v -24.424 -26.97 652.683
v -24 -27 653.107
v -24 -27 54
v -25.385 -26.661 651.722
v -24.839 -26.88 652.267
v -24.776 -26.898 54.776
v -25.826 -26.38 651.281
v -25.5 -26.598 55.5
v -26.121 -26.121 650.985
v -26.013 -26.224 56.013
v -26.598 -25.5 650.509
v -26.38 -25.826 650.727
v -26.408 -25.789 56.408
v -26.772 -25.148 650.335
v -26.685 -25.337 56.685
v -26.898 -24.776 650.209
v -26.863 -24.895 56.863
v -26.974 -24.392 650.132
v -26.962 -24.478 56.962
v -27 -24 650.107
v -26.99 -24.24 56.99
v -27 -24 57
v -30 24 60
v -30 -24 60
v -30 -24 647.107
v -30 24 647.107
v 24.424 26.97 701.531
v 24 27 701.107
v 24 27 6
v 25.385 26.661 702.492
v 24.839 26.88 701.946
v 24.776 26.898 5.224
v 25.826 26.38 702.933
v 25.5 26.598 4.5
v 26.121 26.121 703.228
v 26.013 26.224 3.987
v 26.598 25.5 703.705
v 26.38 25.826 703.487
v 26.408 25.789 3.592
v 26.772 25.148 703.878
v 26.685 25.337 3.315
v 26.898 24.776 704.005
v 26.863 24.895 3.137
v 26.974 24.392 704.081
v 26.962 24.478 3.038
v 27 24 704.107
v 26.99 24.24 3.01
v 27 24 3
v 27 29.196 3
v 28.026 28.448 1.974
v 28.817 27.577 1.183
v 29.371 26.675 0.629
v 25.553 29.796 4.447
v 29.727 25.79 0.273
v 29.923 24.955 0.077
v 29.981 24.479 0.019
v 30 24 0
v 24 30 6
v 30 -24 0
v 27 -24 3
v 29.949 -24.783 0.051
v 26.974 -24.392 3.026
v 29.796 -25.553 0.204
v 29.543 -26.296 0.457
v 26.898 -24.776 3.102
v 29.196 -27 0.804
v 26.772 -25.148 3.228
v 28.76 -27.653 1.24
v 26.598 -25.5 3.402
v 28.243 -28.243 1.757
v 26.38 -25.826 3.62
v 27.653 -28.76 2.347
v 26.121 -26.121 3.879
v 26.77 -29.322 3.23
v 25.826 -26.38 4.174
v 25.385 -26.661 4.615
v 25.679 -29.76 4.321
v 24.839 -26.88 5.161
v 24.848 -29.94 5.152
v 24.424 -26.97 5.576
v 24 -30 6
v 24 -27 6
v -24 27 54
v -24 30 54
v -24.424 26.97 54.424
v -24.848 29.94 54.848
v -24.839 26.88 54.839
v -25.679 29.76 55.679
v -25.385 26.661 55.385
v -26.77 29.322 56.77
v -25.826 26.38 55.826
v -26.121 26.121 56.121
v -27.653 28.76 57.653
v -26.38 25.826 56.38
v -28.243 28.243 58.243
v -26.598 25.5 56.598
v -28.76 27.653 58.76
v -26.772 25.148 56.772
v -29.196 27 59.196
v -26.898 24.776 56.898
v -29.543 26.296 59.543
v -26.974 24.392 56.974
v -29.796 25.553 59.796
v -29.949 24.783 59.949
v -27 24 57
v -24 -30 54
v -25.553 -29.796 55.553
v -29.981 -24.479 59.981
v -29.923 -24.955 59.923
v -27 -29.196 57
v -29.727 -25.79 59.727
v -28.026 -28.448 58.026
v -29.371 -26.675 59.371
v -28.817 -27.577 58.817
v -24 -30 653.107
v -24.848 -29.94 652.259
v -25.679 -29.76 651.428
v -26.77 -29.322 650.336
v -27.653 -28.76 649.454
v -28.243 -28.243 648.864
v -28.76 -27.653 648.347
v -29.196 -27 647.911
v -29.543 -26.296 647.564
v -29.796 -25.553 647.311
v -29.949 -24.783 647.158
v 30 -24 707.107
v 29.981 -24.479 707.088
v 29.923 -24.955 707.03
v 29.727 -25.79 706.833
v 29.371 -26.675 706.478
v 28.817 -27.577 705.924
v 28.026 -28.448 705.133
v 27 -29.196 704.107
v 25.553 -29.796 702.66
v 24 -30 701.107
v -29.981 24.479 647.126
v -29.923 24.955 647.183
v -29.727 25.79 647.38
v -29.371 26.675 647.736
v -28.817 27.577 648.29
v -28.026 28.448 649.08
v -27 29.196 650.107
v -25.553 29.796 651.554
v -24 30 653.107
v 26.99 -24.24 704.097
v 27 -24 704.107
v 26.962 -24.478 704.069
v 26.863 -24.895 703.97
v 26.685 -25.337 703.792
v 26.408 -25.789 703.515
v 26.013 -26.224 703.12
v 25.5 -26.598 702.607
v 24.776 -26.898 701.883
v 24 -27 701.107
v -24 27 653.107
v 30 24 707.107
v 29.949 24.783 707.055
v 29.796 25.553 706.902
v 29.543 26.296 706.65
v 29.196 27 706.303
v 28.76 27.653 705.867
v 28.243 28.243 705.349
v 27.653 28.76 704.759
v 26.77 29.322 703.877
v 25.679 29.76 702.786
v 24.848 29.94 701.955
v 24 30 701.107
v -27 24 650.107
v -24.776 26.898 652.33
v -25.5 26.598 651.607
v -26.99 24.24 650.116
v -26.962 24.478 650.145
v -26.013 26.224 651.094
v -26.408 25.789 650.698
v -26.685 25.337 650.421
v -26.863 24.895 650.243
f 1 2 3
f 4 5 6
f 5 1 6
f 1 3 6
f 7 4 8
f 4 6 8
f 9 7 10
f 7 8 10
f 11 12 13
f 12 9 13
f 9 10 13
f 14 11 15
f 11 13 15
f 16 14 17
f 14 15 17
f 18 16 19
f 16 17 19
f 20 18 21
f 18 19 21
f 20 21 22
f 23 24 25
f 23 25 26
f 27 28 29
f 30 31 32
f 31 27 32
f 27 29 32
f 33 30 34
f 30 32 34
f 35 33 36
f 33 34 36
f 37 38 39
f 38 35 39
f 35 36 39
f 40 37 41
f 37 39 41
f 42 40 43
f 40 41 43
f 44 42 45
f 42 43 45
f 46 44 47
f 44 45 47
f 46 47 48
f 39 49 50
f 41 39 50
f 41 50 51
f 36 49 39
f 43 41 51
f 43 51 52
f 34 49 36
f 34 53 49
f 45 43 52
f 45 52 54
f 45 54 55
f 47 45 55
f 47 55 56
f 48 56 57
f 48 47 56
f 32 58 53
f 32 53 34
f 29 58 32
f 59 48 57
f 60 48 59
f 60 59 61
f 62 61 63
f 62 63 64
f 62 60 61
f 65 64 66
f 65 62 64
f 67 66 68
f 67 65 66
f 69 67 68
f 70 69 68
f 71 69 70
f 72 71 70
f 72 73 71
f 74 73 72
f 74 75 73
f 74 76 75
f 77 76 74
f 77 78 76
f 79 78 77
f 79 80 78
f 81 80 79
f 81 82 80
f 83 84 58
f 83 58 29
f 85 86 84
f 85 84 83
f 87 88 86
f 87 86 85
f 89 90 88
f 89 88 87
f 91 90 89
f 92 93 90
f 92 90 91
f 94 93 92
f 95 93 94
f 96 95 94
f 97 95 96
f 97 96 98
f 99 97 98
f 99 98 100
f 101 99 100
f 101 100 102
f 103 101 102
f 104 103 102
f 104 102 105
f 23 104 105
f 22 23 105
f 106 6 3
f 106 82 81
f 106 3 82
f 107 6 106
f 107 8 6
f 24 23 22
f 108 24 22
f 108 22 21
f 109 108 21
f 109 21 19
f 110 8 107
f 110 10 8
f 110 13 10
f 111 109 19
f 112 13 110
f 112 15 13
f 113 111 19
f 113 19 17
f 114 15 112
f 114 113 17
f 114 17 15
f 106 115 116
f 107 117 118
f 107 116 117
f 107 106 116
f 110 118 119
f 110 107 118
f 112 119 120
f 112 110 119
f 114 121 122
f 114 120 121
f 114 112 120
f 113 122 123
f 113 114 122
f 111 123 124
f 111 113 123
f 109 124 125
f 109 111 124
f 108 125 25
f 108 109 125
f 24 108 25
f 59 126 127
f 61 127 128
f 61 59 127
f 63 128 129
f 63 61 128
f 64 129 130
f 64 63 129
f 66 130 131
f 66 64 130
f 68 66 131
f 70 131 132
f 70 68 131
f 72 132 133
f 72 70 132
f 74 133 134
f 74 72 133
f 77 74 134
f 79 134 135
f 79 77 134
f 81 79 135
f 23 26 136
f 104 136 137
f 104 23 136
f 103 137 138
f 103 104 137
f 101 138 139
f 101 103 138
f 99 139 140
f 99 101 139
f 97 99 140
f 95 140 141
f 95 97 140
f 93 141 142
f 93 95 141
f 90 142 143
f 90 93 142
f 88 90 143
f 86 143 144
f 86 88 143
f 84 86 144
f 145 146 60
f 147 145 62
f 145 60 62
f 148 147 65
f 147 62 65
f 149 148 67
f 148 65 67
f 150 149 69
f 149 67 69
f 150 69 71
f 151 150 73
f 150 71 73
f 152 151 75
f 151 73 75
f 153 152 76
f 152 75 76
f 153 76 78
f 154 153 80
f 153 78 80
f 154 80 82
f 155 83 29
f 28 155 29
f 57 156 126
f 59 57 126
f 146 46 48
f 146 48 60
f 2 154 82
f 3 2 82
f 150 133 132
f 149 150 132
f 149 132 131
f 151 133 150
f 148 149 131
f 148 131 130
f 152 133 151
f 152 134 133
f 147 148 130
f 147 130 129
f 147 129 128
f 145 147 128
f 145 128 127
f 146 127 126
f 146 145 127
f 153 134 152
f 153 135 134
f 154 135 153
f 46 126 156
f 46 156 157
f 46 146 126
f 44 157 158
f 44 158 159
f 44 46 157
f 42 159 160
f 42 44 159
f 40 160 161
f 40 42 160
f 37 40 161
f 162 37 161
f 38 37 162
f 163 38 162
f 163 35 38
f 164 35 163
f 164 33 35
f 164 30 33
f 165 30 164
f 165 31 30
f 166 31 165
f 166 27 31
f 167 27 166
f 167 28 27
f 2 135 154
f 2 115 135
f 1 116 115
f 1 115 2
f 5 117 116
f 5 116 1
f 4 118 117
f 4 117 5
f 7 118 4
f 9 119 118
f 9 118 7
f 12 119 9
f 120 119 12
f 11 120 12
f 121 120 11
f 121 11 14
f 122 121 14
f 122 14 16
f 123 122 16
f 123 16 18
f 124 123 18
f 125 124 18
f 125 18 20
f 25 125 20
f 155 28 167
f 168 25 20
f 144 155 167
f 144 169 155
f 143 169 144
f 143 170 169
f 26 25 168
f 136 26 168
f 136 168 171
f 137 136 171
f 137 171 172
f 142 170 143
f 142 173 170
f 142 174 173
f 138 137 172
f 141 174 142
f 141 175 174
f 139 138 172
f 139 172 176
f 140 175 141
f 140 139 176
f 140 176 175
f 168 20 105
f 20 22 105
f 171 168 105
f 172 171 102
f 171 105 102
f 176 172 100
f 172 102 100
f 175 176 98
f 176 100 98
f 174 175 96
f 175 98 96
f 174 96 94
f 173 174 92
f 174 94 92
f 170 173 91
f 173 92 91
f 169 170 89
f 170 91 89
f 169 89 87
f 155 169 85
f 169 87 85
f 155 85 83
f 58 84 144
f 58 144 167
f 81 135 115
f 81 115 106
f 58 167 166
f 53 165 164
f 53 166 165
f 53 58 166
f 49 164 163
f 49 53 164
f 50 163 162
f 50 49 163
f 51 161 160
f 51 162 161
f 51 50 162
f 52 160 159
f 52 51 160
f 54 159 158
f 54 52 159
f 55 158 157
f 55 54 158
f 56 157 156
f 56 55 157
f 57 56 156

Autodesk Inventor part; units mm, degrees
ref_plane "Start plane" through (0, 0, 0) normal (0, 0, 1) x (1, 0, 0)
ref_plane "End plane" through (0, 0, 707.1068) normal (0, 0, 1) x (1, 0, 0)
sketch "Sketch" plane through (0, 0, 0) normal (0, 0, 1) x (1, 0, 0)
  line L0 (-30, -24) -> (-30, 24)
  line L1 (-24, 30) -> (24, 30)
  line L2 (30, 24) -> (30, -24)
  line L3 (24, -30) -> (-24, -30)
  arc A0 (-30, -24) -> (-24, -30) centre (-24, -24) ccw
  arc A1 (30, 24) -> (24, 30) centre (24, 24) ccw
  arc A2 (-24, 30) -> (-30, 24) centre (-24, 24) ccw
  arc A3 (24, -30) -> (30, -24) centre (24, -24) ccw
  arc A4 (-24, 27) -> (-27, 24) centre (-24, 24) ccw
  line L4 (-24, 27) -> (24, 27)
  arc A5 (27, 24) -> (24, 27) centre (24, 24) ccw
  line L5 (27, 24) -> (27, -24)
  arc A6 (24, -27) -> (27, -24) centre (24, -24) ccw
  line L6 (24, -27) -> (-24, -27)
  arc A7 (-27, -24) -> (-24, -27) centre (-24, -24) ccw
  line L7 (-27, -24) -> (-27, 24)
  line L8 (0, 43.7397) -> (0, -43.7397) construction
  line L9 (-43.7397, 0) -> (43.7397, 0) construction
  dimension "d7" = 6
  dimension "d9" = 60
  dimension "d11" = 60
  dimension "d12" = 3
  dimension "d15" = 30
  dimension "d16" = 30
extrude "Body" add sketch "Sketch" along normal up to surface (707.1068 mm away) from surface at 0
sketch "Sketch3" plane through (0, 0, 0) normal (0, 0, 1) x (1, 0, 0)
  line L0 (0, 0) -> (10, 0)
ref_plane "Work Plane3" through (0, 0, 0) normal (0, -1, 0) x (1, 0, 0)
ref_plane "Work Plane4" through (1691.7009, -22, 2368.8077) normal (-0.7071, 0, 0.7071) x (0.7071, 0, 0.7071)
split "Split1" plane through (1691.7009, -22, 2368.8077) removes the side toward (-0.7071, 0, 0.7071)
ref_plane "Work Plane5" through (-323.5534, 50, 353.5534) normal (-0.7071, 0, -0.7071) x (-0.7071, 0, 0.7071)
split "Split2" plane through (-323.5534, 50, 353.5534) removes the side toward (-0.7071, 0, -0.7071)
sketch "Sketch4" plane through (0, 0, 0) normal (0, -1, 0) x (1, 0, 0)
  line L0 (-2, 0) -> (12, 0) projected
  line L1 (-2, 707.1068) -> (12, 707.1068) projected
  dimension "d18" = 707.1068
equation "\"d7\" = G_IR"
equation "\"d9\" = G_W"
equation "\"d11\" = G_H"
equation "\"d12\" = G_T"
equation "\"d15\" = 0.5 * d9"
equation "\"d16\" = 0.5 * d11"
equation "\"d3\" = G_L"
equation "\"G_W\" = 60"
equation "\"G_H\" = 60"
equation "\"G_T\" = 3"
equation "\"G_IR\" = 6"
equation "\"G_L\" = d18"
equation "\"G_OFFSET_START\" = 0"
equation "\"G_OFFSET_END\" = -141.42136"
equation "\"d14\" = G_OFFSET_END + B_L"
equation "\"B_L\" = 848.52814"
properties part number "ISO 10799-2 - 60x60x3 - 707,11" material "Steel, Mild"
